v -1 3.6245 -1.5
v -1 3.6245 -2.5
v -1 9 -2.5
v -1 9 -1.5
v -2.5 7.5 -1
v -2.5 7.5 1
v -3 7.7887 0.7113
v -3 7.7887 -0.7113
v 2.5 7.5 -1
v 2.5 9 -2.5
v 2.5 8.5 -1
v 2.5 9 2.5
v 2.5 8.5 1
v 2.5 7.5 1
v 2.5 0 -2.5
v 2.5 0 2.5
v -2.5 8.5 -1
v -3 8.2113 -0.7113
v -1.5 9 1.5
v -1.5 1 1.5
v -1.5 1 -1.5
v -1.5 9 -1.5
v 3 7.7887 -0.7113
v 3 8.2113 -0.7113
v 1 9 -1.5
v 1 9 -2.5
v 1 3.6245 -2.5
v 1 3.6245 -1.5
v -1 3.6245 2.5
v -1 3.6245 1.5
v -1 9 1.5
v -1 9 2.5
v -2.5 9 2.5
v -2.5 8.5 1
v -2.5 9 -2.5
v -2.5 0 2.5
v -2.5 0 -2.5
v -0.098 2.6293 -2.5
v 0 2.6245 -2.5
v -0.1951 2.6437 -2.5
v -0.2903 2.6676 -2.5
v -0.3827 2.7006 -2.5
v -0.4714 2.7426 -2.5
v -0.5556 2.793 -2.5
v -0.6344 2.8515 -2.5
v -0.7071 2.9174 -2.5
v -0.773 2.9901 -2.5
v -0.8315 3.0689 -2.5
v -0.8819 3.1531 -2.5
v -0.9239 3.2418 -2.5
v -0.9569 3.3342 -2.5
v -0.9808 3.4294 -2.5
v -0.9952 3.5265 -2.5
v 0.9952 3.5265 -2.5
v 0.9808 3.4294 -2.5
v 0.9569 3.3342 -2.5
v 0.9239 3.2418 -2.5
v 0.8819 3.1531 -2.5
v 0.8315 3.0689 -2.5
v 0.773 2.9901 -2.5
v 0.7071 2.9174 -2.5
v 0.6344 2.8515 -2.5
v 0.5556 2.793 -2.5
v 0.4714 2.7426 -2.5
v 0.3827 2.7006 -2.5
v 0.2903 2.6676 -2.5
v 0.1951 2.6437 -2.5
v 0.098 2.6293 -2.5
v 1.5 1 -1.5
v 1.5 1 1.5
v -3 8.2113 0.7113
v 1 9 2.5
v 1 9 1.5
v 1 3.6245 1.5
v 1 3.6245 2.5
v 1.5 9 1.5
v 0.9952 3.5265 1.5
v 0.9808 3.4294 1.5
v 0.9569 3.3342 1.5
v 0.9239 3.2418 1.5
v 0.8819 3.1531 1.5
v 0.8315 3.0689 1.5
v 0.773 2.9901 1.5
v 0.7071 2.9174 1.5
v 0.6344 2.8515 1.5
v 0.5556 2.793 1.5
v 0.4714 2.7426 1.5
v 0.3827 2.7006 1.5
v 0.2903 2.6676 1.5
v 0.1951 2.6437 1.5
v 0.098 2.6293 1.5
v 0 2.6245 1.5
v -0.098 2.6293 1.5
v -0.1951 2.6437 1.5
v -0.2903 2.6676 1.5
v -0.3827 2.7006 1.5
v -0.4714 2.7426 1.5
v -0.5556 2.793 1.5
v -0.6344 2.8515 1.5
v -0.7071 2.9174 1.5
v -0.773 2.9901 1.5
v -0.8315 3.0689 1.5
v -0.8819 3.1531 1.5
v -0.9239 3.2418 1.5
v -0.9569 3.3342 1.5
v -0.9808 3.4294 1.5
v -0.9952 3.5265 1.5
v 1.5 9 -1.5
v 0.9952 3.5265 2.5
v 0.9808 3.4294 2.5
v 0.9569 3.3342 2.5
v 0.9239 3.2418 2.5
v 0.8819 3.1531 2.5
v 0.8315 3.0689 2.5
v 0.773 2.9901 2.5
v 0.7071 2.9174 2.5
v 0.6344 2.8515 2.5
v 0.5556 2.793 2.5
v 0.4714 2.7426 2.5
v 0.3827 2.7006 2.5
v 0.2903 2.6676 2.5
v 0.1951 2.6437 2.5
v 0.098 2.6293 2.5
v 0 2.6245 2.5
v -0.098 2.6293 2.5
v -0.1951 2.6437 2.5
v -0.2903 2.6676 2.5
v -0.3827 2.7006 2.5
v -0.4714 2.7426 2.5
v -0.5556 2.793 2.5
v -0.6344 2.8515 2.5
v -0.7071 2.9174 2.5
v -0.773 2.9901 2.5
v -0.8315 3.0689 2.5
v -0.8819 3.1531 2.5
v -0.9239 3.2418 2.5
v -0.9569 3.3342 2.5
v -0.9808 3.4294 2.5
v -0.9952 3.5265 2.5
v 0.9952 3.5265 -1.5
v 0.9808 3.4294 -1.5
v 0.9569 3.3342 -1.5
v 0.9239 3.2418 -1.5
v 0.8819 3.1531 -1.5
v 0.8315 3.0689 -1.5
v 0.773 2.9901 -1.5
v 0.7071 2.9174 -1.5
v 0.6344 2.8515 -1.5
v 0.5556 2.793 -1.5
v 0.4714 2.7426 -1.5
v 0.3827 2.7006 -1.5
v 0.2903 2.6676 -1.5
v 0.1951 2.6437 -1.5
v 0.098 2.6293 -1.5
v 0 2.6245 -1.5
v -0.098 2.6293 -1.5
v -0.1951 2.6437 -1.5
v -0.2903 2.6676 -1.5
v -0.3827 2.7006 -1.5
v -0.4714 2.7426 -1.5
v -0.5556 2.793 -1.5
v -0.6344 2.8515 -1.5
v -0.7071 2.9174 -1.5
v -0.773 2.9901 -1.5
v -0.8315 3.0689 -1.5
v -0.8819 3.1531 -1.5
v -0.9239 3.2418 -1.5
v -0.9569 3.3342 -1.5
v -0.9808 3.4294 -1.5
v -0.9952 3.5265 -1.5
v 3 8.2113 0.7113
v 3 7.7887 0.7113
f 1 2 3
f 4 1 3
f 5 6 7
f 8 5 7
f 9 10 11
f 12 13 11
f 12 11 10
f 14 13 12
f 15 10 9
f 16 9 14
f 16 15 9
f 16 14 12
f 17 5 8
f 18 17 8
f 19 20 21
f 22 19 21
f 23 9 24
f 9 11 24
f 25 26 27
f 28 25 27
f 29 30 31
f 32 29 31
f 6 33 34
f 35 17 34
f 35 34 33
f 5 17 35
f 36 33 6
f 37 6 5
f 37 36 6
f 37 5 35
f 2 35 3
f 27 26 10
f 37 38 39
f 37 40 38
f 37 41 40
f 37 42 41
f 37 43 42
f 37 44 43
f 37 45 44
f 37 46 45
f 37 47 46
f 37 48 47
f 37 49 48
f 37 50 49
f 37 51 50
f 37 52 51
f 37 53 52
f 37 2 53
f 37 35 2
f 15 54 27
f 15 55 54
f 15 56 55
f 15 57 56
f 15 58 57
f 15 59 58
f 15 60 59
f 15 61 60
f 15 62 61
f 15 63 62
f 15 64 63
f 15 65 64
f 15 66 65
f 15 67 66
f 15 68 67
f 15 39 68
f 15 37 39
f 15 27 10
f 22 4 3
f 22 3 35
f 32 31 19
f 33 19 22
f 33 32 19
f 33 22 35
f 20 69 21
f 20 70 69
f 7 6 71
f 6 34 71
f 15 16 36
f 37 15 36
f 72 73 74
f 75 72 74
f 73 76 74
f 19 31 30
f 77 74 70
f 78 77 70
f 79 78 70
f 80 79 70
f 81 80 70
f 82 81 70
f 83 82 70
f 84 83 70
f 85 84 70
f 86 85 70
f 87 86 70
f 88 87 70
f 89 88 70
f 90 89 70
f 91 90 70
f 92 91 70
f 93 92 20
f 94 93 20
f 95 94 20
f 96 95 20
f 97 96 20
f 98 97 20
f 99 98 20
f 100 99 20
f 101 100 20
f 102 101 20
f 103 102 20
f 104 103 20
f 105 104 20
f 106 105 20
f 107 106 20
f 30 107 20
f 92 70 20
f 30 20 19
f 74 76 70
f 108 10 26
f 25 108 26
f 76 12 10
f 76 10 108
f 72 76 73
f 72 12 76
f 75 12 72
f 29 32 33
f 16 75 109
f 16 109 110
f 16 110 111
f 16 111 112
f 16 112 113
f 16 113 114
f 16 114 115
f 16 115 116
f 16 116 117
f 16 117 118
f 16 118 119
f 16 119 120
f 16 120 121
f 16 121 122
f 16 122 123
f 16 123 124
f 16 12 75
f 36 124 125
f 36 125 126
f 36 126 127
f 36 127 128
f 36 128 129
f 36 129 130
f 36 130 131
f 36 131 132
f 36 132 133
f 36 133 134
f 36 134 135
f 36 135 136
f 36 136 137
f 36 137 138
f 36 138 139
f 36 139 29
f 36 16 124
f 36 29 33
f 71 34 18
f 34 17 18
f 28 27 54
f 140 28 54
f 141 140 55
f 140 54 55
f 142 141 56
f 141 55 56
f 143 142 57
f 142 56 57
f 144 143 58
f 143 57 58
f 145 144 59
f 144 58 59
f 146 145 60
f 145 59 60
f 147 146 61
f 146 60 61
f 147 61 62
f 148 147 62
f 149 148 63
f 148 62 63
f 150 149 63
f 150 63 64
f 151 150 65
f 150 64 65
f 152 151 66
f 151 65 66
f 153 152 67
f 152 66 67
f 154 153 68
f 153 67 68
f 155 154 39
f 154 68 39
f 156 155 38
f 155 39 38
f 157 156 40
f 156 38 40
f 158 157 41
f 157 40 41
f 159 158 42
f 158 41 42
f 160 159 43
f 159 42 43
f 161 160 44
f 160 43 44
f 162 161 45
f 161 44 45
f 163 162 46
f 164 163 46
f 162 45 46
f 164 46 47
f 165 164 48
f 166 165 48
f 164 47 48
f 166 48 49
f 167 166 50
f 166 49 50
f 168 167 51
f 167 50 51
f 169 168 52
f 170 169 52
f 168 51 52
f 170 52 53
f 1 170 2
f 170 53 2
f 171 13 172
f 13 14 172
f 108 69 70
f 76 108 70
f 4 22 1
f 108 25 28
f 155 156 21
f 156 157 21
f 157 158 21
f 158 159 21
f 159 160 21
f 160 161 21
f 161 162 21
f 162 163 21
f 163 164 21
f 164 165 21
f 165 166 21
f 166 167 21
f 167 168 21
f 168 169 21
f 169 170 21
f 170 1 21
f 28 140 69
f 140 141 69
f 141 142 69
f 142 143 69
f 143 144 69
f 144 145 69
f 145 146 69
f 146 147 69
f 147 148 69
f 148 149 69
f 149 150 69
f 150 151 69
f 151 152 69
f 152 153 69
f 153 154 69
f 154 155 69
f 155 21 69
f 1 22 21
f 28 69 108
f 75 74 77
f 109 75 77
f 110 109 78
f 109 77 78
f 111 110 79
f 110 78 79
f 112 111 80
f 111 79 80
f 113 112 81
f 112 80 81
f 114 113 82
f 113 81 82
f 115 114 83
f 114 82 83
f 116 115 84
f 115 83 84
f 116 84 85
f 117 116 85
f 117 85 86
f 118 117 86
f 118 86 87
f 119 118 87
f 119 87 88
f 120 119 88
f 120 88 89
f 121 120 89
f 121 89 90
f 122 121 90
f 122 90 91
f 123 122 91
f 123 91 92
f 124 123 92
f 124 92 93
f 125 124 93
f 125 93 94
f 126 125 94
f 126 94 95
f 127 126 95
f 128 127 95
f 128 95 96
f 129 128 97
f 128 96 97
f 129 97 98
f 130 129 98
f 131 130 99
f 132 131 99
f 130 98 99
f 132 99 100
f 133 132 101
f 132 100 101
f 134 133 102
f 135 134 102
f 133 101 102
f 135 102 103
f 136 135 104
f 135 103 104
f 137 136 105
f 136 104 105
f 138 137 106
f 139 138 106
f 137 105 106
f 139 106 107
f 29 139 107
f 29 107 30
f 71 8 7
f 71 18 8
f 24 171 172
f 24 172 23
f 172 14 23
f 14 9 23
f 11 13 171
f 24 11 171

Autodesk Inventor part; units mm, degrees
ref_plane "YZ Plane" through (0, 0, 0) normal (1, 0, 0) x (0, 1, 0)
ref_plane "XZ Plane" through (0, 0, 0) normal (0, 1, 0) x (-1, 0, 0)
ref_plane "XY Plane" through (0, 0, 0) normal (0, 0, 1) x (1, 0, 0)
sketch "Sketch1" plane through (0, 0, 0) normal (0, 1, 0) x (-1, 0, 0)
  line L0 (-2.5, 2.5) -> (2.5, 2.5)
  line L1 (2.5, 2.5) -> (2.5, -2.5)
  line L2 (2.5, -2.5) -> (-2.5, -2.5)
  line L3 (-2.5, -2.5) -> (-2.5, 2.5)
  line L4 (-2.5, 2.5) -> (2.5, -2.5) construction
  line L5 (2.5, 2.5) -> (-2.5, -2.5) construction
  point P0 (0, 0)
  dimension "d0" = 5
  dimension "d1" = 5
extrude "Extrusion1" add sketch "Sketch1" along normal blind 9
shell "Shell1" thickness 1 removed faces 1 at (-0.8333, 9, -0.8333)
sketch "Sketch9" plane through (2.5, 0, 2.5) normal (1, 0, 0) x (0, 0, -1)
  line L0 (1.5, 7.5) -> (3.5, 7.5)
  line L1 (3.5, 7.5) -> (3.5, 8.5)
  line L2 (3.5, 8.5) -> (1.5, 8.5)
  line L3 (1.5, 8.5) -> (1.5, 7.5)
  line L4 (1.5, 7.5) -> (3.5, 8.5) construction
  line L5 (3.5, 7.5) -> (1.5, 8.5) construction
  line L6 (0, 9) -> (5, 9) projected
  point P0 (2.5, 0)
  point P1 (2.5, 8)
  dimension "d10" = 1
  dimension "d14" = 2
  dimension "d15" = 1
extrude "Extrusion4" add sketch "Sketch9" along normal blind 0.5 draft -30
sketch "Sketch10" plane through (-2.5, 0, -2.5) normal (-1, 0, 0) x (0, 0, 1)
  line L0 (1.5, 7.5) -> (3.5, 7.5)
  line L1 (3.5, 7.5) -> (3.5, 8.5)
  line L2 (3.5, 8.5) -> (1.5, 8.5)
  line L3 (1.5, 8.5) -> (1.5, 7.5)
  line L4 (1.5, 7.5) -> (3.5, 8.5) construction
  line L5 (3.5, 7.5) -> (1.5, 8.5) construction
  line L6 (0, 9) -> (5, 9) projected
  point P0 (2.5, 0)
  point P1 (2.5, 8)
  dimension "d13" = 1
  dimension "d16" = 2
  dimension "d17" = 1
extrude "Extrusion5" add sketch "Sketch10" along normal blind 0.5 draft -30
sketch "Sketch11" plane through (2.5, 0, -2.5) normal (0, 0, -1) x (-1, 0, 0)
  line L0 (2.5, 7.862) -> (2.5, 3.6245) construction
  line L1 (1.5, 7.862) -> (1.5, 3.6245)
  line L2 (3.5, 3.6245) -> (3.5, 7.862)
  arc A0 (3.5, 7.862) -> (1.5, 7.862) centre (2.5, 7.862) ccw
  arc A1 (1.5, 3.6245) -> (3.5, 3.6245) centre (2.5, 3.6245) ccw
  point P0 (2.5, 0)
  point P1 (2.5, 5.7432)
  dimension "d20" = 2
extrude "Extrusion6" cut sketch "Sketch11" against normal through all
sketch "Sketch12" plane through (2.5, 0, -2.5) normal (0, 0, -1) x (-1, 0, 0)
  line L0 (1.5, 7.862) -> (1.5, 3.6245) projected
  line L1 (1.5, 7.862) -> (3.5, 7.862)
  line L2 (3.5, 7.862) -> (3.5, 10.4679)
  line L3 (3.5, 10.4679) -> (1.5, 10.4679)
  line L4 (1.5, 10.4679) -> (1.5, 7.862)
  point P0 (2.5, 0)
  dimension "d23" = 2
extrude "Extrusion7" cut sketch "Sketch12" against normal through all
equation "\"d16\" = d14"
equation "\"d17\" = d15"
properties part number "snapfit_part_v04"
